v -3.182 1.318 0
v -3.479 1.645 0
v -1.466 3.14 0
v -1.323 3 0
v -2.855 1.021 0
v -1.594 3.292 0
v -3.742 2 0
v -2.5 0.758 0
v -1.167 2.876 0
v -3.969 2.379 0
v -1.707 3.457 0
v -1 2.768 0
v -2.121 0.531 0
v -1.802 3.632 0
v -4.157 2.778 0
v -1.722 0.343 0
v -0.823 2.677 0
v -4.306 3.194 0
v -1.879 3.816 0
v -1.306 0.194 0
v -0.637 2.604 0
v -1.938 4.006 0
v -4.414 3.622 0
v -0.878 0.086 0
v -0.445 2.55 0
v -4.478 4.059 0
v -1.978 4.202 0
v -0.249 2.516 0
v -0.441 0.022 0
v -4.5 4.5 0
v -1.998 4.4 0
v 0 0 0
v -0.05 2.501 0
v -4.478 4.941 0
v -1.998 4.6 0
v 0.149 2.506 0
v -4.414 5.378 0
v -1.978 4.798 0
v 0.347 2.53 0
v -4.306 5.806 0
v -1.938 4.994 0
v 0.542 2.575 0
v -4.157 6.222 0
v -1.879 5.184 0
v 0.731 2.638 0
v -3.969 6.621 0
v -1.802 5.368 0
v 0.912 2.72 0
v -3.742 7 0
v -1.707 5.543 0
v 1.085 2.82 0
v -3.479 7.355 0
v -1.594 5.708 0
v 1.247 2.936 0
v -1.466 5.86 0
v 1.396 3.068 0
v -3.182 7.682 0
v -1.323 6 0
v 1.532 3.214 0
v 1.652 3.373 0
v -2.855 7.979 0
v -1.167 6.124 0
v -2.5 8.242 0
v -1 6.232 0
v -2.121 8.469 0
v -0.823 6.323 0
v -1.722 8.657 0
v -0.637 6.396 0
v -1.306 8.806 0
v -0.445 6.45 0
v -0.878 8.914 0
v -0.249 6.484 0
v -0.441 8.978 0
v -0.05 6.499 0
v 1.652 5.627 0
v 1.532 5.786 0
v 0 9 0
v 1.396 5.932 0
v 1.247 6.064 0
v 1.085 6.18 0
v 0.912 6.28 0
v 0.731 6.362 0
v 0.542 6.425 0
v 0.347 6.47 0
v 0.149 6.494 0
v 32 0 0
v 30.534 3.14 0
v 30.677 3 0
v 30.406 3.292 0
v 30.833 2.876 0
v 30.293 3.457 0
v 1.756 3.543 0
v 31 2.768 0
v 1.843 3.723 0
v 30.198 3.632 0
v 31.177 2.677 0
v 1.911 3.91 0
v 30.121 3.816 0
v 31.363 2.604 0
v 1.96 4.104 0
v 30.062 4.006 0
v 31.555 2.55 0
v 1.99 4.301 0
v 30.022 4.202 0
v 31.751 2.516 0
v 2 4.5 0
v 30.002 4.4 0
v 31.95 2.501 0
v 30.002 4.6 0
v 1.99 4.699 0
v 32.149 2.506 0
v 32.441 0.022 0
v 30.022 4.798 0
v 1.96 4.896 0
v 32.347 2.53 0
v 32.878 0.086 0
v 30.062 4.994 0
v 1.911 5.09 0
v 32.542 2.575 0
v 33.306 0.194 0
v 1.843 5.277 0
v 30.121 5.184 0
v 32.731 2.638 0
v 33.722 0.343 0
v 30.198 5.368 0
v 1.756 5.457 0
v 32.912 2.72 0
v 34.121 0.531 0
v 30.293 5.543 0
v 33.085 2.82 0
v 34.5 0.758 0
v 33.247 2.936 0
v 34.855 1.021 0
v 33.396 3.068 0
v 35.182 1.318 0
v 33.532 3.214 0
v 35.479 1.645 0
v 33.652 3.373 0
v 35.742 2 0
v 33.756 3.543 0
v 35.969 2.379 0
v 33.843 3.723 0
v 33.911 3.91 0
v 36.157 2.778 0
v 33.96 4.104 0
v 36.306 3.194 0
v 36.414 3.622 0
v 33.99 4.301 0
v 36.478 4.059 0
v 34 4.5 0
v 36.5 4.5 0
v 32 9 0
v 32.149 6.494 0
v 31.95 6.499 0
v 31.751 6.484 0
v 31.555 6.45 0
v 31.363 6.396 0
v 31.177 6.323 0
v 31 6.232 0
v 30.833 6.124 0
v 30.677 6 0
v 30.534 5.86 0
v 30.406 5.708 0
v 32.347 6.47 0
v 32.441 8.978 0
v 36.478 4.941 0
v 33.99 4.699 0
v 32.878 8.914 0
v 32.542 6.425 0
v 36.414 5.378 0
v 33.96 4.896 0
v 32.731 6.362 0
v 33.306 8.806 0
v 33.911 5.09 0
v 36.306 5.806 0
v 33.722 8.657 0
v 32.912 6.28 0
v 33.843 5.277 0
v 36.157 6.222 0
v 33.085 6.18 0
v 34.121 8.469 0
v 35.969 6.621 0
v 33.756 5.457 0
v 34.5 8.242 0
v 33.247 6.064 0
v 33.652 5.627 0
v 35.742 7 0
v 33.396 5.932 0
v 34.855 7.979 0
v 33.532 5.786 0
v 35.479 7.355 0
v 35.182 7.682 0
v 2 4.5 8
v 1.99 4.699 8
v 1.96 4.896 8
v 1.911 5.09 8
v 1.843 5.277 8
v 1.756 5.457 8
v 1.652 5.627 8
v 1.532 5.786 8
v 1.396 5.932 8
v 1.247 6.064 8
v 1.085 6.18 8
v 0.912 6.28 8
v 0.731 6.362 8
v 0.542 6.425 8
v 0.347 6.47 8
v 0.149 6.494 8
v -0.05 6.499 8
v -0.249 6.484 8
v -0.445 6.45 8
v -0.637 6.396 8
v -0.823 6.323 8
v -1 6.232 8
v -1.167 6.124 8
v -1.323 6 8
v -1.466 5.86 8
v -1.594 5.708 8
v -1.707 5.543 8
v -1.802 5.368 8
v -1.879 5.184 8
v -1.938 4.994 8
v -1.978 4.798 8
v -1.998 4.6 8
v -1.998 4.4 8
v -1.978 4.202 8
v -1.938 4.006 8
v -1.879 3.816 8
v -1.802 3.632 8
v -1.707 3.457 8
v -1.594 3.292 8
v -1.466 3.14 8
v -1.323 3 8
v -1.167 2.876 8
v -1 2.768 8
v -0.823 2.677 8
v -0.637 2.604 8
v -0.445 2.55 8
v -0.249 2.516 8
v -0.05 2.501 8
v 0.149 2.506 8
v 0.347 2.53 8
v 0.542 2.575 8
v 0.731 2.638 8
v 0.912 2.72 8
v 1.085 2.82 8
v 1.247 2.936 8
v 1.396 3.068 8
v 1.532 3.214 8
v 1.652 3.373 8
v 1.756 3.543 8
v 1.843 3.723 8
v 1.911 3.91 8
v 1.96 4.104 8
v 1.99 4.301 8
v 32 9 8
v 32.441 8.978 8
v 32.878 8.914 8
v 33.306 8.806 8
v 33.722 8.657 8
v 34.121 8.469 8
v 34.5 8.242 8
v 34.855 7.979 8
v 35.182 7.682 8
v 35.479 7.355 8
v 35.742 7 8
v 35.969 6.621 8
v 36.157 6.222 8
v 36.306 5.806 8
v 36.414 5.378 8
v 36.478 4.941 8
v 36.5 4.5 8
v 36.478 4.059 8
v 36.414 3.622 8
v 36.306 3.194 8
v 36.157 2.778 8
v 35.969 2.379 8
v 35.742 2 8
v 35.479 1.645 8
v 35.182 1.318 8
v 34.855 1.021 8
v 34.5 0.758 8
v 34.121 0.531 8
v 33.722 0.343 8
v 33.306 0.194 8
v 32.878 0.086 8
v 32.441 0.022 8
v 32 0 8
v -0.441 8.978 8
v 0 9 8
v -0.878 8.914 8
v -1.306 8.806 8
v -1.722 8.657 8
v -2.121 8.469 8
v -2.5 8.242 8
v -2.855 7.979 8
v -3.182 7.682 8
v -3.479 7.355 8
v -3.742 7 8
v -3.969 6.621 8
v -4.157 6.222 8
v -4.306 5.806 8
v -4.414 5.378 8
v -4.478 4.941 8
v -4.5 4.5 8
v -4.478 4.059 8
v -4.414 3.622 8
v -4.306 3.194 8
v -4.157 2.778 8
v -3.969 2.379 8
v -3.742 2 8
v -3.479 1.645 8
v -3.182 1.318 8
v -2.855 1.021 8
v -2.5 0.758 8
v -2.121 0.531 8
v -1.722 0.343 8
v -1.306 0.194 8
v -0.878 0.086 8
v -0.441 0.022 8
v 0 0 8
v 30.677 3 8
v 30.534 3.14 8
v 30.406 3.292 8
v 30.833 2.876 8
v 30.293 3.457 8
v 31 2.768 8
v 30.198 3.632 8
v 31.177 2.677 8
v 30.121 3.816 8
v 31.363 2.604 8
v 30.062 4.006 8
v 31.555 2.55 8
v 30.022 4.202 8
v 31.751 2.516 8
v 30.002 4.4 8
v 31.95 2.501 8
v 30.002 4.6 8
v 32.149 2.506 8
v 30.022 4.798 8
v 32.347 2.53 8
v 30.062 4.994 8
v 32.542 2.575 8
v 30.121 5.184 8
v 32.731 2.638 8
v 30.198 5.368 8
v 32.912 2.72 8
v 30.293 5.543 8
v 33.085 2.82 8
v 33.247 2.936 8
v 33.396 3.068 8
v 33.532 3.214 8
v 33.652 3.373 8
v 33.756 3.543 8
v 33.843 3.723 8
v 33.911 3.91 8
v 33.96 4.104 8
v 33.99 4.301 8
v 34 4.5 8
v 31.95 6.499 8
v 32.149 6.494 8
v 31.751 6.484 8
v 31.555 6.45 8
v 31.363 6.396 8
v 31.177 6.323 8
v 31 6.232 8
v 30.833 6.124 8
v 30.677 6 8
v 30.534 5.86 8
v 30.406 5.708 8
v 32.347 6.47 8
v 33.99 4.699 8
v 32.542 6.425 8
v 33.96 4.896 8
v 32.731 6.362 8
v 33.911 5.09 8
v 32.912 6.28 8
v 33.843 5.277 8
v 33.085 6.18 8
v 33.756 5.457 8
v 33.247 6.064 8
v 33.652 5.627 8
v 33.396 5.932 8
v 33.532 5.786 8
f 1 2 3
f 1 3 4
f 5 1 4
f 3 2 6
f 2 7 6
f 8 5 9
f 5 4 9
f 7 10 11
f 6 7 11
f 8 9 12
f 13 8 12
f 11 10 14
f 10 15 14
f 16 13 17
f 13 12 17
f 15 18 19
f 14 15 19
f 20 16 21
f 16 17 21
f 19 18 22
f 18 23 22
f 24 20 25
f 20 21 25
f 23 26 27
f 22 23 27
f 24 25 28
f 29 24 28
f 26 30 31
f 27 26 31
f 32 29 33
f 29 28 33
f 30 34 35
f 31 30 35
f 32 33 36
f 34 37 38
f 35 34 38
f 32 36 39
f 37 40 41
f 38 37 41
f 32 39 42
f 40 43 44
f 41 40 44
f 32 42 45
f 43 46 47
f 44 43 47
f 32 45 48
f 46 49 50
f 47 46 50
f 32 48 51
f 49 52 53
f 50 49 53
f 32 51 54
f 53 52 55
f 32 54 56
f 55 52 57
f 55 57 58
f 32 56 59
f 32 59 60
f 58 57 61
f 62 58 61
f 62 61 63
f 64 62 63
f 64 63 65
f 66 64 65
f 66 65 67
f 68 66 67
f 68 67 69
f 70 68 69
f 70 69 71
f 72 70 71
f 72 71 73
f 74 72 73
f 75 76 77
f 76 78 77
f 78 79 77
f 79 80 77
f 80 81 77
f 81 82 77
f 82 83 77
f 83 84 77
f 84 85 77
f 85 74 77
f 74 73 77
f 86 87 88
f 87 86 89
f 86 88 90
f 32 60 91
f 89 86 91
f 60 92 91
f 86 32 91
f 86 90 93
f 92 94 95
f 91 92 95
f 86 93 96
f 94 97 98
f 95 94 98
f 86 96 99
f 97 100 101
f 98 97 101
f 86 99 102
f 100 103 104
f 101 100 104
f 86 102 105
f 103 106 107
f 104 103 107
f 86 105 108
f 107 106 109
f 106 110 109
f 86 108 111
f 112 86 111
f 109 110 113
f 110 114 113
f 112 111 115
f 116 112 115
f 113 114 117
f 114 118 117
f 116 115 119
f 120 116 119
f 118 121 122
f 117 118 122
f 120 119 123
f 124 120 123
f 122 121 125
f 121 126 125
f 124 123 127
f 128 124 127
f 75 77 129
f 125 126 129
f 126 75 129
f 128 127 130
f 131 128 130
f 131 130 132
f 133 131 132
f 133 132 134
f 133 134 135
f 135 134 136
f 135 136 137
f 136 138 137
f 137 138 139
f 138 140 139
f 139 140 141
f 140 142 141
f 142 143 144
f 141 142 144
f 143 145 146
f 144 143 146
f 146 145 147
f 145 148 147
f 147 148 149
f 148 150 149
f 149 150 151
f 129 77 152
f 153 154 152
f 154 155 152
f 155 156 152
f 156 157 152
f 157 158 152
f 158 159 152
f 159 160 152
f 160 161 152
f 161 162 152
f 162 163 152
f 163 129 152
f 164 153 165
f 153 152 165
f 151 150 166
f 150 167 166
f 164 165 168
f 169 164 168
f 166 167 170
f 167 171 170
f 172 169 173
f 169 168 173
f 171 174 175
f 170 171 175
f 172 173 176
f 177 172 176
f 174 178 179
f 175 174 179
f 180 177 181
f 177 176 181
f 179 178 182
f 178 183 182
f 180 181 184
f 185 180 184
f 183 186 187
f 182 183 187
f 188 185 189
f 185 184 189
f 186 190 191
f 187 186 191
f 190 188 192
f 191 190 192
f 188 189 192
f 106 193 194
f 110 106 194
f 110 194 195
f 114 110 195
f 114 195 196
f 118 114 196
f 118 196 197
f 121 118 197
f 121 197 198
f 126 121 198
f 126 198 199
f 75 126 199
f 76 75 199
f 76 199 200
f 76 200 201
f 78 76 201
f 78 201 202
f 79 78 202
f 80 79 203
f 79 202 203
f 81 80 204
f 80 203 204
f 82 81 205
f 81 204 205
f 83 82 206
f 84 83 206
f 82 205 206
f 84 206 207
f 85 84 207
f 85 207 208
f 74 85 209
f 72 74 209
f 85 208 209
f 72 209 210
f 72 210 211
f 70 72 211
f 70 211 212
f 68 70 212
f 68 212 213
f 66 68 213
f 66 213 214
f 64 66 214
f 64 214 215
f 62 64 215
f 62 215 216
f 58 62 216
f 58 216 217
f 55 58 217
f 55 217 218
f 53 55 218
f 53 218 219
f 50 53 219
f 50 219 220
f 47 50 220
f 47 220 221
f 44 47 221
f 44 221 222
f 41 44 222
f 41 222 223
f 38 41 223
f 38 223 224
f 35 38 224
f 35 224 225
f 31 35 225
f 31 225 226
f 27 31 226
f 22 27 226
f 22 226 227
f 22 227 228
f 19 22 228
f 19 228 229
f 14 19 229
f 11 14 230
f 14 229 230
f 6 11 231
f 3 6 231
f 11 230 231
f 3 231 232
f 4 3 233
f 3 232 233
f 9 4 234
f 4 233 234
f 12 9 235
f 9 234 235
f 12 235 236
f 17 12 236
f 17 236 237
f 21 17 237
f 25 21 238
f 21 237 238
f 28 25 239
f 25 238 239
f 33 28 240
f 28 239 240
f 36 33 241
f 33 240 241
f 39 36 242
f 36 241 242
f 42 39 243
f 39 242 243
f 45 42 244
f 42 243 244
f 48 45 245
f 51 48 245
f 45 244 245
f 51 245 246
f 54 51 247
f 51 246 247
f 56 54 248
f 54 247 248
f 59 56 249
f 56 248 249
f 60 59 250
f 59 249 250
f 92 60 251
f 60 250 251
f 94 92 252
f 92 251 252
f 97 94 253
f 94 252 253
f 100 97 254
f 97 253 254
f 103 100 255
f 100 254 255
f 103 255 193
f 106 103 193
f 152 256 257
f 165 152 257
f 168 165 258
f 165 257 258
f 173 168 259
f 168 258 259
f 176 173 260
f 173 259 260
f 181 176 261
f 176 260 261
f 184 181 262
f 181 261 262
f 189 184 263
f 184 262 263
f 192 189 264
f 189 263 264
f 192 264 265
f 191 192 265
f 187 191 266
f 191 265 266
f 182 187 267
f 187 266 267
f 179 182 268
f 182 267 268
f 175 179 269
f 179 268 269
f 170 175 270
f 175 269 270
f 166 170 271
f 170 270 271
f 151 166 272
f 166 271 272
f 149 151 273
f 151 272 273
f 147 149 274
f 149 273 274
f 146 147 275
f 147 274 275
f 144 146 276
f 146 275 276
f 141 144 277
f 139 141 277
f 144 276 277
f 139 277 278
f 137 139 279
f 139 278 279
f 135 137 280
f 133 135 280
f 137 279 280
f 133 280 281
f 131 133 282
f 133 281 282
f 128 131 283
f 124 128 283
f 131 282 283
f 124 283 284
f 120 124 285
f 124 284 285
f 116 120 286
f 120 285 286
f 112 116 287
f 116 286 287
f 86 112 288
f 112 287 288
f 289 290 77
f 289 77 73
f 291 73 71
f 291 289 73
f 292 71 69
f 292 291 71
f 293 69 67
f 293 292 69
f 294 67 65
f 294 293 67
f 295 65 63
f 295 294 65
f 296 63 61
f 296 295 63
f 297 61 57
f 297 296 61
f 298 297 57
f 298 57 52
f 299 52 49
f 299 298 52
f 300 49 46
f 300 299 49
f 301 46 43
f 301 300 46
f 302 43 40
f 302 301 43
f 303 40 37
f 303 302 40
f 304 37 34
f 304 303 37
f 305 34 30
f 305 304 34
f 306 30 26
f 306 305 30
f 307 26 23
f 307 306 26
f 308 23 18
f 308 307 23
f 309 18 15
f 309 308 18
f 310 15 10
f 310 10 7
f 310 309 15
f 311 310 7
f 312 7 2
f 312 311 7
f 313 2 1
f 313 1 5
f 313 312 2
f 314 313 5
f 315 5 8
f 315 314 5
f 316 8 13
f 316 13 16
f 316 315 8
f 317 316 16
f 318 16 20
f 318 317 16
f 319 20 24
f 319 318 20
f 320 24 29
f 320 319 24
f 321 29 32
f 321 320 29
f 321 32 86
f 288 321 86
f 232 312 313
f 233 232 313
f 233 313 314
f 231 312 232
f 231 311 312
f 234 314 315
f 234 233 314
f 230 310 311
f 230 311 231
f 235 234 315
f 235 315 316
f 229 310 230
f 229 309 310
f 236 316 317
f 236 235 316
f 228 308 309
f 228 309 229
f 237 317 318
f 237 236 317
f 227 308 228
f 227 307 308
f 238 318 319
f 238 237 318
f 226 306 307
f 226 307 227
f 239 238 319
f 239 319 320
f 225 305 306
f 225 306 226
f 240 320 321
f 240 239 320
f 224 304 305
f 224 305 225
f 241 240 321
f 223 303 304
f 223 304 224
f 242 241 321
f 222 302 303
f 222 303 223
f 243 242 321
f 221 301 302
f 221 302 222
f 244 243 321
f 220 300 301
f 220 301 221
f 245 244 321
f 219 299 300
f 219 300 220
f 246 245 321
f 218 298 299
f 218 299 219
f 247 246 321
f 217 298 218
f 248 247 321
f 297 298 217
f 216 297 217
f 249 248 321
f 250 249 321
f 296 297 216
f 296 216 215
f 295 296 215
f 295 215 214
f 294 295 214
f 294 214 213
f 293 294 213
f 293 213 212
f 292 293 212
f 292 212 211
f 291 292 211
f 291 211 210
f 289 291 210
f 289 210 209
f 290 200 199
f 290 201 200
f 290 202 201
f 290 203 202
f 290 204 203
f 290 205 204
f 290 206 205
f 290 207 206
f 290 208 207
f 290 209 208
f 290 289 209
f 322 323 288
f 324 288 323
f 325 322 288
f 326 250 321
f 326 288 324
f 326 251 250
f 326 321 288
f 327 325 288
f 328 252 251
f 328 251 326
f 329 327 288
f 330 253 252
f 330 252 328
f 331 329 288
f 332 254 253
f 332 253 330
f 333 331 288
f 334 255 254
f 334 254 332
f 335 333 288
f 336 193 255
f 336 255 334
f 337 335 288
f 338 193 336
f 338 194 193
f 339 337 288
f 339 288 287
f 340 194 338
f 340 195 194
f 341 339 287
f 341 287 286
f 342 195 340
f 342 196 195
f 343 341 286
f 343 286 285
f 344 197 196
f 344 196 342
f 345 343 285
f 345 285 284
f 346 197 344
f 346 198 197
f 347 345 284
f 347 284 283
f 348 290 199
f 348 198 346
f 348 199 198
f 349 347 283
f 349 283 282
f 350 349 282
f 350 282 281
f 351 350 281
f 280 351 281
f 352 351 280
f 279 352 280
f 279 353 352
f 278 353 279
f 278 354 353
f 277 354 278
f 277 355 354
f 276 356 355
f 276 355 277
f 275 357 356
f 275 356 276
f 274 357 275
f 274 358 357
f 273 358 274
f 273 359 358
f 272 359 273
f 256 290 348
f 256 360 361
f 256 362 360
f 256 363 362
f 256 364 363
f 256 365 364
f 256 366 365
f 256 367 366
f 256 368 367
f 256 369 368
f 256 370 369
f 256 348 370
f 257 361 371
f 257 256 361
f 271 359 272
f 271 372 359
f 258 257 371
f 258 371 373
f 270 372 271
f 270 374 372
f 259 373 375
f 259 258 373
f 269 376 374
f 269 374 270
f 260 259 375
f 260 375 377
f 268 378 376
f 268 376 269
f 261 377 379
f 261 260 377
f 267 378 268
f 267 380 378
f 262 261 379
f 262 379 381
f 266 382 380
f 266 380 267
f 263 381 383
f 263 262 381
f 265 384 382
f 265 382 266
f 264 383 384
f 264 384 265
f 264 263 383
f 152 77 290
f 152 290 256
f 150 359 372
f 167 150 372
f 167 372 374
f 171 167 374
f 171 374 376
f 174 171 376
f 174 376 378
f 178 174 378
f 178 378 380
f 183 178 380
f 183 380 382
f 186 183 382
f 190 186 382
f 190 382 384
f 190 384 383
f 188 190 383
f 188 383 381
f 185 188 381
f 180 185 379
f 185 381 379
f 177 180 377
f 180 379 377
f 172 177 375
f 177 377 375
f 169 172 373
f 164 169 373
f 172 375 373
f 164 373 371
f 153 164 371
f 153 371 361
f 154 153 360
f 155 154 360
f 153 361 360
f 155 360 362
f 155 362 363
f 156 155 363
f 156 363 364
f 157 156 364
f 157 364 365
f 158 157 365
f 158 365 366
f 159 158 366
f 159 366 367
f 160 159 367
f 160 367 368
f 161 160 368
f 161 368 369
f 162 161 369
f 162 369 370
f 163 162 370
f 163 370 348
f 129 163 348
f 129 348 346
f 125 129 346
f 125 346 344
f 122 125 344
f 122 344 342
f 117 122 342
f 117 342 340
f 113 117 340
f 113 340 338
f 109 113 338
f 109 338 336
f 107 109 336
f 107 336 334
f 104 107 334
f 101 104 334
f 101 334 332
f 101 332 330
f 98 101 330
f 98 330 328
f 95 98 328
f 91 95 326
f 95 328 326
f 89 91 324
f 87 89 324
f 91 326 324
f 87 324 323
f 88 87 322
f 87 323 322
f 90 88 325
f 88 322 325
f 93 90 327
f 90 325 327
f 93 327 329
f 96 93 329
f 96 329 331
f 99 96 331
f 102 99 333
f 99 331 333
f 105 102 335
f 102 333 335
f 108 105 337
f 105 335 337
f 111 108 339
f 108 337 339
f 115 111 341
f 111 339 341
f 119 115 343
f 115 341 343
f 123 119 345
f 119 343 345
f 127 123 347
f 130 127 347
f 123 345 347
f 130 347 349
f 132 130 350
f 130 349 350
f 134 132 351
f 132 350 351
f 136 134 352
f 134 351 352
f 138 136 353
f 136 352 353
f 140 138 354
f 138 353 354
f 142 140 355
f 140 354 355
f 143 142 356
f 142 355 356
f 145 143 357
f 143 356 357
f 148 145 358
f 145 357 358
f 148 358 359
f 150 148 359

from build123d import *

# Parameters (mm, degrees)
ESQUISSE1_W             = 32
ESQUISSE1_H             = 9
BOSS_EXTRU_1_DEPTH      = 8
BOSS_EXTRU_2_DEPTH      = 8
ESQUISSE3_R             = 2
ENL_V_MAT_EXTRU_1_DEPTH = 39.435010082


with BuildPart() as part:
    # Esquisse1 → Boss.-Extru.1 (new body)
    with BuildSketch(Plane.XY):
        with Locations((16, 4.5)):
            Rectangle(ESQUISSE1_W, ESQUISSE1_H)
    extrude(amount=BOSS_EXTRU_1_DEPTH)

    # Esquisse2 → Boss.-Extru.2 (add)
    with BuildSketch(Plane.XY.offset(8)):
        with BuildLine():
            Line((0, 0), (0, 9))
            ThreePointArc((0, 9), (-4.5, 4.5), (0, 0))
        make_face()
        with BuildLine():
            Line((32, 0), (32, 9))
            ThreePointArc((32, 9), (36.5, 4.5), (32, 0))
        make_face()
    extrude(amount=-BOSS_EXTRU_2_DEPTH)

    # Esquisse3 → Enlèv. mat.-Extru.1 (cut, through all)
    with BuildSketch(Plane.XY.offset(8)):
        with Locations((32, 4.5)):
            Circle(ESQUISSE3_R)
        with Locations((0, 4.5)):
            Circle(ESQUISSE3_R)
    extrude(amount=-ENL_V_MAT_EXTRU_1_DEPTH, mode=Mode.SUBTRACT)


solid = part.part
